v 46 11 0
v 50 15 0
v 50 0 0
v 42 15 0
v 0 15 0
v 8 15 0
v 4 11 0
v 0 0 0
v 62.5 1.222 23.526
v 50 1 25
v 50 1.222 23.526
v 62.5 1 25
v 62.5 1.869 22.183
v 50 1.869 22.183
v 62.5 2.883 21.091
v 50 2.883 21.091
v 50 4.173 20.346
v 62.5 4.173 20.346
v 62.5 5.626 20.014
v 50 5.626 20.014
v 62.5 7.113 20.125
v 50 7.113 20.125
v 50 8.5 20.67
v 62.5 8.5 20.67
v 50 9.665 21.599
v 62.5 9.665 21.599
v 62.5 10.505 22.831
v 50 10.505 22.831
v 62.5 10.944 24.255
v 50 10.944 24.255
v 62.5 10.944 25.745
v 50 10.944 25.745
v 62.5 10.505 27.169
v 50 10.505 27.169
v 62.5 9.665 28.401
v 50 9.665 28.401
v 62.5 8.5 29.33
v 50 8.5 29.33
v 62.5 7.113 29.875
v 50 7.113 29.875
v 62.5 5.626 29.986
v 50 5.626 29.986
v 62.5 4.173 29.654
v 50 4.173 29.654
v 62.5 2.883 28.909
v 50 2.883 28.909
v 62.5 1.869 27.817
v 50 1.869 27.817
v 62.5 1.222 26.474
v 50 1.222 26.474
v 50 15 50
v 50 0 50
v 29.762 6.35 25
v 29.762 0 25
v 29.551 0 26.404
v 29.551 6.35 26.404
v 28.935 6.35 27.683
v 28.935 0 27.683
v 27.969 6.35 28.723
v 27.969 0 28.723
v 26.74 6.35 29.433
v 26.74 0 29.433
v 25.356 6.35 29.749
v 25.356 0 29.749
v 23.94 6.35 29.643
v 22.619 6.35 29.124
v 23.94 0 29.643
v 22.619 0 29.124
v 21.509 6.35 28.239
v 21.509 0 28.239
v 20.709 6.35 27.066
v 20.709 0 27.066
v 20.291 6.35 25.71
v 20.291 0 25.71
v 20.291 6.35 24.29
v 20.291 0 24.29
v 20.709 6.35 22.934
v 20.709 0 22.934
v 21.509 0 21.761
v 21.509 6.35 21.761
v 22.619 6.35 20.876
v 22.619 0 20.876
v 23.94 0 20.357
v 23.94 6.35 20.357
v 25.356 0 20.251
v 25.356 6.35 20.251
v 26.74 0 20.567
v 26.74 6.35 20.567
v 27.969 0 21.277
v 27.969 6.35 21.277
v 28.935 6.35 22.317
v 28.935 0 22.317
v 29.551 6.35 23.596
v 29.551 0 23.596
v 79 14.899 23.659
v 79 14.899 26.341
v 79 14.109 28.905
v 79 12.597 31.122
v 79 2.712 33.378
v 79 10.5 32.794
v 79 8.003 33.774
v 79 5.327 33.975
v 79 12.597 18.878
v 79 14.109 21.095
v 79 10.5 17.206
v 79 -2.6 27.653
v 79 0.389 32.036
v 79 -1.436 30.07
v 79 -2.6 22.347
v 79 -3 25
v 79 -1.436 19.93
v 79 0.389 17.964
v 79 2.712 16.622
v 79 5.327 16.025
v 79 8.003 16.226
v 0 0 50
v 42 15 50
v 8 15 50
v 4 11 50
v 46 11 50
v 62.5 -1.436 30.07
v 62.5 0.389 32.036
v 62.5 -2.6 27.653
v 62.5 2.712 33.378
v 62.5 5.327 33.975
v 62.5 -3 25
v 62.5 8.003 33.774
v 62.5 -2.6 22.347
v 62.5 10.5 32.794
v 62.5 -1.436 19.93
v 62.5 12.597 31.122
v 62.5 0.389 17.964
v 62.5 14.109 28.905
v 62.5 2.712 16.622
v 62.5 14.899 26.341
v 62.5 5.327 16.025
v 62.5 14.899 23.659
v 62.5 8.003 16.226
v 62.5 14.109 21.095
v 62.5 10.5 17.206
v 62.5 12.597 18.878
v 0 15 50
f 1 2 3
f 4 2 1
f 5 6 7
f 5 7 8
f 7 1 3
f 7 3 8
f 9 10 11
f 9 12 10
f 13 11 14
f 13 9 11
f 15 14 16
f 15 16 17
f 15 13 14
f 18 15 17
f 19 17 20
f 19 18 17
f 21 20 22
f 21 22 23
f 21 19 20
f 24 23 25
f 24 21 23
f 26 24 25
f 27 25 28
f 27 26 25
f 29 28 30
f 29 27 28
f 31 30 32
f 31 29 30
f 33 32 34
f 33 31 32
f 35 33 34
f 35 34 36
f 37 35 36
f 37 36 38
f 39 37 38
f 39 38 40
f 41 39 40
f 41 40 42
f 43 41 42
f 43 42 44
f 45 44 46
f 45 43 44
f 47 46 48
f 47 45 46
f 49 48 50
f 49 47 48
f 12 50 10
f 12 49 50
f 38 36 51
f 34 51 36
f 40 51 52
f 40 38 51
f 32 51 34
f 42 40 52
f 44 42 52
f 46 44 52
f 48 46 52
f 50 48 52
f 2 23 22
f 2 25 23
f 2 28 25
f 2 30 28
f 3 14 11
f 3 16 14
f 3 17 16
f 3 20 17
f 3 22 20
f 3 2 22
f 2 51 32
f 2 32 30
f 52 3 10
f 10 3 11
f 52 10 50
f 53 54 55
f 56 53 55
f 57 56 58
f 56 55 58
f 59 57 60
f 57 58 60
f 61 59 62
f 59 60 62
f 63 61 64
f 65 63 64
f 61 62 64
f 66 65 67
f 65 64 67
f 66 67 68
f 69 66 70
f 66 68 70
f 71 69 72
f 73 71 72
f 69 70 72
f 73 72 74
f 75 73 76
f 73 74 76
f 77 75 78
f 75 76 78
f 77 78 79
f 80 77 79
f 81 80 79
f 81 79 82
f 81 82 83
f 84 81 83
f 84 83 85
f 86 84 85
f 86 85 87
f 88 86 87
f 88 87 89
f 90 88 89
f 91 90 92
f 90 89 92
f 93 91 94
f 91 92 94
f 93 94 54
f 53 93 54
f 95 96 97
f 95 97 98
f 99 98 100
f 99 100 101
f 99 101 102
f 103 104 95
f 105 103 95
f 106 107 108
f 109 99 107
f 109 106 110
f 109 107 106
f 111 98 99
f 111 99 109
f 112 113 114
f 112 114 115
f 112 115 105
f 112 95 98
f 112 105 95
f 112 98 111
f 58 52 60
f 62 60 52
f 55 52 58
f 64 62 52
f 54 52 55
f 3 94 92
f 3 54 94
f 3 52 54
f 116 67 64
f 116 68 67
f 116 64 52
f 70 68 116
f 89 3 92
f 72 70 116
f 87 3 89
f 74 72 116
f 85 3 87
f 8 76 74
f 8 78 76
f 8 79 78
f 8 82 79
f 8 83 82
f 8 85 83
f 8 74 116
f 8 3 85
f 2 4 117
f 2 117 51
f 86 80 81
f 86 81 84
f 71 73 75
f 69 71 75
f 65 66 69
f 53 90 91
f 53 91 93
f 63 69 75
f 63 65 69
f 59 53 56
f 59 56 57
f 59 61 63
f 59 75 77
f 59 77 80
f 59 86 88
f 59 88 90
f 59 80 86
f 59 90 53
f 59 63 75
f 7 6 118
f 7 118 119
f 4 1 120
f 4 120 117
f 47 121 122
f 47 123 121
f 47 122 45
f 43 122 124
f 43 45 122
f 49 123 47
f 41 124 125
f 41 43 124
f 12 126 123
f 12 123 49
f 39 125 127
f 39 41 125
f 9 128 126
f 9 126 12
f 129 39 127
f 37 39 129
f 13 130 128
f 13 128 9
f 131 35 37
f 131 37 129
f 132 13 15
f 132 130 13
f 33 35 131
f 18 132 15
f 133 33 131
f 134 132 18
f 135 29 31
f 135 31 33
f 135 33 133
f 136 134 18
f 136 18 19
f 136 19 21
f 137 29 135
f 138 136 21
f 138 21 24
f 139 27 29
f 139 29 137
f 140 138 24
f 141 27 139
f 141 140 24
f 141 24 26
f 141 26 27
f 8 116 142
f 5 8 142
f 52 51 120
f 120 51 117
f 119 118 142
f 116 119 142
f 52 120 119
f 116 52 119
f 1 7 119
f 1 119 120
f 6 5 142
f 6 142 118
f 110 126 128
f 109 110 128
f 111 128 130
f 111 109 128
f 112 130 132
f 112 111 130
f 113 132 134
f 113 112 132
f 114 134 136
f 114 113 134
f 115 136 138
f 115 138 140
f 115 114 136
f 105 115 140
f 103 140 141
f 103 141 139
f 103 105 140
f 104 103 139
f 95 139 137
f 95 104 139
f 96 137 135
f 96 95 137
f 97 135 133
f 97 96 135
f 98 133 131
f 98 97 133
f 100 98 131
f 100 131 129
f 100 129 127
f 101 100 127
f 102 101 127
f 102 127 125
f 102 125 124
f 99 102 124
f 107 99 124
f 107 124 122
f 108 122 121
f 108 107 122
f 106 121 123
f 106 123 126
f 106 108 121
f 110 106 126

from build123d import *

# Parameters (mm, degrees)
BOSS_EXTRUDE1_DEPTH = 50
SKETCH3_R           = 4.7625
CUT_EXTRUDE1_DEPTH  = 6.35


with BuildPart() as part:
    # Sketch1 → Boss-Extrude1 (new body)
    with BuildSketch(Plane.XY):
        Polygon((0, 0), (0, 15), (8, 15), (4, 11), (46, 11), (42, 15), (50, 15), (50, 0), align=None)
    extrude(amount=BOSS_EXTRUDE1_DEPTH)

    # Sketch2 → Revolve2 (revolve)
    with BuildSketch(Plane.XY.offset(25)):
        Polygon((50, 6), (50, 1), (62.5, 1), (62.5, -3), (79, -3), (79, 6), align=None)
    revolve(axis=Axis((50, 6, 25), (1, 0, 0)))

    # Sketch3 → Cut-Extrude1 (cut)
    with BuildSketch(Plane.XZ):
        with Locations((25, 25)):
            Circle(SKETCH3_R)
    extrude(amount=-CUT_EXTRUDE1_DEPTH, mode=Mode.SUBTRACT)


solid = part.part
